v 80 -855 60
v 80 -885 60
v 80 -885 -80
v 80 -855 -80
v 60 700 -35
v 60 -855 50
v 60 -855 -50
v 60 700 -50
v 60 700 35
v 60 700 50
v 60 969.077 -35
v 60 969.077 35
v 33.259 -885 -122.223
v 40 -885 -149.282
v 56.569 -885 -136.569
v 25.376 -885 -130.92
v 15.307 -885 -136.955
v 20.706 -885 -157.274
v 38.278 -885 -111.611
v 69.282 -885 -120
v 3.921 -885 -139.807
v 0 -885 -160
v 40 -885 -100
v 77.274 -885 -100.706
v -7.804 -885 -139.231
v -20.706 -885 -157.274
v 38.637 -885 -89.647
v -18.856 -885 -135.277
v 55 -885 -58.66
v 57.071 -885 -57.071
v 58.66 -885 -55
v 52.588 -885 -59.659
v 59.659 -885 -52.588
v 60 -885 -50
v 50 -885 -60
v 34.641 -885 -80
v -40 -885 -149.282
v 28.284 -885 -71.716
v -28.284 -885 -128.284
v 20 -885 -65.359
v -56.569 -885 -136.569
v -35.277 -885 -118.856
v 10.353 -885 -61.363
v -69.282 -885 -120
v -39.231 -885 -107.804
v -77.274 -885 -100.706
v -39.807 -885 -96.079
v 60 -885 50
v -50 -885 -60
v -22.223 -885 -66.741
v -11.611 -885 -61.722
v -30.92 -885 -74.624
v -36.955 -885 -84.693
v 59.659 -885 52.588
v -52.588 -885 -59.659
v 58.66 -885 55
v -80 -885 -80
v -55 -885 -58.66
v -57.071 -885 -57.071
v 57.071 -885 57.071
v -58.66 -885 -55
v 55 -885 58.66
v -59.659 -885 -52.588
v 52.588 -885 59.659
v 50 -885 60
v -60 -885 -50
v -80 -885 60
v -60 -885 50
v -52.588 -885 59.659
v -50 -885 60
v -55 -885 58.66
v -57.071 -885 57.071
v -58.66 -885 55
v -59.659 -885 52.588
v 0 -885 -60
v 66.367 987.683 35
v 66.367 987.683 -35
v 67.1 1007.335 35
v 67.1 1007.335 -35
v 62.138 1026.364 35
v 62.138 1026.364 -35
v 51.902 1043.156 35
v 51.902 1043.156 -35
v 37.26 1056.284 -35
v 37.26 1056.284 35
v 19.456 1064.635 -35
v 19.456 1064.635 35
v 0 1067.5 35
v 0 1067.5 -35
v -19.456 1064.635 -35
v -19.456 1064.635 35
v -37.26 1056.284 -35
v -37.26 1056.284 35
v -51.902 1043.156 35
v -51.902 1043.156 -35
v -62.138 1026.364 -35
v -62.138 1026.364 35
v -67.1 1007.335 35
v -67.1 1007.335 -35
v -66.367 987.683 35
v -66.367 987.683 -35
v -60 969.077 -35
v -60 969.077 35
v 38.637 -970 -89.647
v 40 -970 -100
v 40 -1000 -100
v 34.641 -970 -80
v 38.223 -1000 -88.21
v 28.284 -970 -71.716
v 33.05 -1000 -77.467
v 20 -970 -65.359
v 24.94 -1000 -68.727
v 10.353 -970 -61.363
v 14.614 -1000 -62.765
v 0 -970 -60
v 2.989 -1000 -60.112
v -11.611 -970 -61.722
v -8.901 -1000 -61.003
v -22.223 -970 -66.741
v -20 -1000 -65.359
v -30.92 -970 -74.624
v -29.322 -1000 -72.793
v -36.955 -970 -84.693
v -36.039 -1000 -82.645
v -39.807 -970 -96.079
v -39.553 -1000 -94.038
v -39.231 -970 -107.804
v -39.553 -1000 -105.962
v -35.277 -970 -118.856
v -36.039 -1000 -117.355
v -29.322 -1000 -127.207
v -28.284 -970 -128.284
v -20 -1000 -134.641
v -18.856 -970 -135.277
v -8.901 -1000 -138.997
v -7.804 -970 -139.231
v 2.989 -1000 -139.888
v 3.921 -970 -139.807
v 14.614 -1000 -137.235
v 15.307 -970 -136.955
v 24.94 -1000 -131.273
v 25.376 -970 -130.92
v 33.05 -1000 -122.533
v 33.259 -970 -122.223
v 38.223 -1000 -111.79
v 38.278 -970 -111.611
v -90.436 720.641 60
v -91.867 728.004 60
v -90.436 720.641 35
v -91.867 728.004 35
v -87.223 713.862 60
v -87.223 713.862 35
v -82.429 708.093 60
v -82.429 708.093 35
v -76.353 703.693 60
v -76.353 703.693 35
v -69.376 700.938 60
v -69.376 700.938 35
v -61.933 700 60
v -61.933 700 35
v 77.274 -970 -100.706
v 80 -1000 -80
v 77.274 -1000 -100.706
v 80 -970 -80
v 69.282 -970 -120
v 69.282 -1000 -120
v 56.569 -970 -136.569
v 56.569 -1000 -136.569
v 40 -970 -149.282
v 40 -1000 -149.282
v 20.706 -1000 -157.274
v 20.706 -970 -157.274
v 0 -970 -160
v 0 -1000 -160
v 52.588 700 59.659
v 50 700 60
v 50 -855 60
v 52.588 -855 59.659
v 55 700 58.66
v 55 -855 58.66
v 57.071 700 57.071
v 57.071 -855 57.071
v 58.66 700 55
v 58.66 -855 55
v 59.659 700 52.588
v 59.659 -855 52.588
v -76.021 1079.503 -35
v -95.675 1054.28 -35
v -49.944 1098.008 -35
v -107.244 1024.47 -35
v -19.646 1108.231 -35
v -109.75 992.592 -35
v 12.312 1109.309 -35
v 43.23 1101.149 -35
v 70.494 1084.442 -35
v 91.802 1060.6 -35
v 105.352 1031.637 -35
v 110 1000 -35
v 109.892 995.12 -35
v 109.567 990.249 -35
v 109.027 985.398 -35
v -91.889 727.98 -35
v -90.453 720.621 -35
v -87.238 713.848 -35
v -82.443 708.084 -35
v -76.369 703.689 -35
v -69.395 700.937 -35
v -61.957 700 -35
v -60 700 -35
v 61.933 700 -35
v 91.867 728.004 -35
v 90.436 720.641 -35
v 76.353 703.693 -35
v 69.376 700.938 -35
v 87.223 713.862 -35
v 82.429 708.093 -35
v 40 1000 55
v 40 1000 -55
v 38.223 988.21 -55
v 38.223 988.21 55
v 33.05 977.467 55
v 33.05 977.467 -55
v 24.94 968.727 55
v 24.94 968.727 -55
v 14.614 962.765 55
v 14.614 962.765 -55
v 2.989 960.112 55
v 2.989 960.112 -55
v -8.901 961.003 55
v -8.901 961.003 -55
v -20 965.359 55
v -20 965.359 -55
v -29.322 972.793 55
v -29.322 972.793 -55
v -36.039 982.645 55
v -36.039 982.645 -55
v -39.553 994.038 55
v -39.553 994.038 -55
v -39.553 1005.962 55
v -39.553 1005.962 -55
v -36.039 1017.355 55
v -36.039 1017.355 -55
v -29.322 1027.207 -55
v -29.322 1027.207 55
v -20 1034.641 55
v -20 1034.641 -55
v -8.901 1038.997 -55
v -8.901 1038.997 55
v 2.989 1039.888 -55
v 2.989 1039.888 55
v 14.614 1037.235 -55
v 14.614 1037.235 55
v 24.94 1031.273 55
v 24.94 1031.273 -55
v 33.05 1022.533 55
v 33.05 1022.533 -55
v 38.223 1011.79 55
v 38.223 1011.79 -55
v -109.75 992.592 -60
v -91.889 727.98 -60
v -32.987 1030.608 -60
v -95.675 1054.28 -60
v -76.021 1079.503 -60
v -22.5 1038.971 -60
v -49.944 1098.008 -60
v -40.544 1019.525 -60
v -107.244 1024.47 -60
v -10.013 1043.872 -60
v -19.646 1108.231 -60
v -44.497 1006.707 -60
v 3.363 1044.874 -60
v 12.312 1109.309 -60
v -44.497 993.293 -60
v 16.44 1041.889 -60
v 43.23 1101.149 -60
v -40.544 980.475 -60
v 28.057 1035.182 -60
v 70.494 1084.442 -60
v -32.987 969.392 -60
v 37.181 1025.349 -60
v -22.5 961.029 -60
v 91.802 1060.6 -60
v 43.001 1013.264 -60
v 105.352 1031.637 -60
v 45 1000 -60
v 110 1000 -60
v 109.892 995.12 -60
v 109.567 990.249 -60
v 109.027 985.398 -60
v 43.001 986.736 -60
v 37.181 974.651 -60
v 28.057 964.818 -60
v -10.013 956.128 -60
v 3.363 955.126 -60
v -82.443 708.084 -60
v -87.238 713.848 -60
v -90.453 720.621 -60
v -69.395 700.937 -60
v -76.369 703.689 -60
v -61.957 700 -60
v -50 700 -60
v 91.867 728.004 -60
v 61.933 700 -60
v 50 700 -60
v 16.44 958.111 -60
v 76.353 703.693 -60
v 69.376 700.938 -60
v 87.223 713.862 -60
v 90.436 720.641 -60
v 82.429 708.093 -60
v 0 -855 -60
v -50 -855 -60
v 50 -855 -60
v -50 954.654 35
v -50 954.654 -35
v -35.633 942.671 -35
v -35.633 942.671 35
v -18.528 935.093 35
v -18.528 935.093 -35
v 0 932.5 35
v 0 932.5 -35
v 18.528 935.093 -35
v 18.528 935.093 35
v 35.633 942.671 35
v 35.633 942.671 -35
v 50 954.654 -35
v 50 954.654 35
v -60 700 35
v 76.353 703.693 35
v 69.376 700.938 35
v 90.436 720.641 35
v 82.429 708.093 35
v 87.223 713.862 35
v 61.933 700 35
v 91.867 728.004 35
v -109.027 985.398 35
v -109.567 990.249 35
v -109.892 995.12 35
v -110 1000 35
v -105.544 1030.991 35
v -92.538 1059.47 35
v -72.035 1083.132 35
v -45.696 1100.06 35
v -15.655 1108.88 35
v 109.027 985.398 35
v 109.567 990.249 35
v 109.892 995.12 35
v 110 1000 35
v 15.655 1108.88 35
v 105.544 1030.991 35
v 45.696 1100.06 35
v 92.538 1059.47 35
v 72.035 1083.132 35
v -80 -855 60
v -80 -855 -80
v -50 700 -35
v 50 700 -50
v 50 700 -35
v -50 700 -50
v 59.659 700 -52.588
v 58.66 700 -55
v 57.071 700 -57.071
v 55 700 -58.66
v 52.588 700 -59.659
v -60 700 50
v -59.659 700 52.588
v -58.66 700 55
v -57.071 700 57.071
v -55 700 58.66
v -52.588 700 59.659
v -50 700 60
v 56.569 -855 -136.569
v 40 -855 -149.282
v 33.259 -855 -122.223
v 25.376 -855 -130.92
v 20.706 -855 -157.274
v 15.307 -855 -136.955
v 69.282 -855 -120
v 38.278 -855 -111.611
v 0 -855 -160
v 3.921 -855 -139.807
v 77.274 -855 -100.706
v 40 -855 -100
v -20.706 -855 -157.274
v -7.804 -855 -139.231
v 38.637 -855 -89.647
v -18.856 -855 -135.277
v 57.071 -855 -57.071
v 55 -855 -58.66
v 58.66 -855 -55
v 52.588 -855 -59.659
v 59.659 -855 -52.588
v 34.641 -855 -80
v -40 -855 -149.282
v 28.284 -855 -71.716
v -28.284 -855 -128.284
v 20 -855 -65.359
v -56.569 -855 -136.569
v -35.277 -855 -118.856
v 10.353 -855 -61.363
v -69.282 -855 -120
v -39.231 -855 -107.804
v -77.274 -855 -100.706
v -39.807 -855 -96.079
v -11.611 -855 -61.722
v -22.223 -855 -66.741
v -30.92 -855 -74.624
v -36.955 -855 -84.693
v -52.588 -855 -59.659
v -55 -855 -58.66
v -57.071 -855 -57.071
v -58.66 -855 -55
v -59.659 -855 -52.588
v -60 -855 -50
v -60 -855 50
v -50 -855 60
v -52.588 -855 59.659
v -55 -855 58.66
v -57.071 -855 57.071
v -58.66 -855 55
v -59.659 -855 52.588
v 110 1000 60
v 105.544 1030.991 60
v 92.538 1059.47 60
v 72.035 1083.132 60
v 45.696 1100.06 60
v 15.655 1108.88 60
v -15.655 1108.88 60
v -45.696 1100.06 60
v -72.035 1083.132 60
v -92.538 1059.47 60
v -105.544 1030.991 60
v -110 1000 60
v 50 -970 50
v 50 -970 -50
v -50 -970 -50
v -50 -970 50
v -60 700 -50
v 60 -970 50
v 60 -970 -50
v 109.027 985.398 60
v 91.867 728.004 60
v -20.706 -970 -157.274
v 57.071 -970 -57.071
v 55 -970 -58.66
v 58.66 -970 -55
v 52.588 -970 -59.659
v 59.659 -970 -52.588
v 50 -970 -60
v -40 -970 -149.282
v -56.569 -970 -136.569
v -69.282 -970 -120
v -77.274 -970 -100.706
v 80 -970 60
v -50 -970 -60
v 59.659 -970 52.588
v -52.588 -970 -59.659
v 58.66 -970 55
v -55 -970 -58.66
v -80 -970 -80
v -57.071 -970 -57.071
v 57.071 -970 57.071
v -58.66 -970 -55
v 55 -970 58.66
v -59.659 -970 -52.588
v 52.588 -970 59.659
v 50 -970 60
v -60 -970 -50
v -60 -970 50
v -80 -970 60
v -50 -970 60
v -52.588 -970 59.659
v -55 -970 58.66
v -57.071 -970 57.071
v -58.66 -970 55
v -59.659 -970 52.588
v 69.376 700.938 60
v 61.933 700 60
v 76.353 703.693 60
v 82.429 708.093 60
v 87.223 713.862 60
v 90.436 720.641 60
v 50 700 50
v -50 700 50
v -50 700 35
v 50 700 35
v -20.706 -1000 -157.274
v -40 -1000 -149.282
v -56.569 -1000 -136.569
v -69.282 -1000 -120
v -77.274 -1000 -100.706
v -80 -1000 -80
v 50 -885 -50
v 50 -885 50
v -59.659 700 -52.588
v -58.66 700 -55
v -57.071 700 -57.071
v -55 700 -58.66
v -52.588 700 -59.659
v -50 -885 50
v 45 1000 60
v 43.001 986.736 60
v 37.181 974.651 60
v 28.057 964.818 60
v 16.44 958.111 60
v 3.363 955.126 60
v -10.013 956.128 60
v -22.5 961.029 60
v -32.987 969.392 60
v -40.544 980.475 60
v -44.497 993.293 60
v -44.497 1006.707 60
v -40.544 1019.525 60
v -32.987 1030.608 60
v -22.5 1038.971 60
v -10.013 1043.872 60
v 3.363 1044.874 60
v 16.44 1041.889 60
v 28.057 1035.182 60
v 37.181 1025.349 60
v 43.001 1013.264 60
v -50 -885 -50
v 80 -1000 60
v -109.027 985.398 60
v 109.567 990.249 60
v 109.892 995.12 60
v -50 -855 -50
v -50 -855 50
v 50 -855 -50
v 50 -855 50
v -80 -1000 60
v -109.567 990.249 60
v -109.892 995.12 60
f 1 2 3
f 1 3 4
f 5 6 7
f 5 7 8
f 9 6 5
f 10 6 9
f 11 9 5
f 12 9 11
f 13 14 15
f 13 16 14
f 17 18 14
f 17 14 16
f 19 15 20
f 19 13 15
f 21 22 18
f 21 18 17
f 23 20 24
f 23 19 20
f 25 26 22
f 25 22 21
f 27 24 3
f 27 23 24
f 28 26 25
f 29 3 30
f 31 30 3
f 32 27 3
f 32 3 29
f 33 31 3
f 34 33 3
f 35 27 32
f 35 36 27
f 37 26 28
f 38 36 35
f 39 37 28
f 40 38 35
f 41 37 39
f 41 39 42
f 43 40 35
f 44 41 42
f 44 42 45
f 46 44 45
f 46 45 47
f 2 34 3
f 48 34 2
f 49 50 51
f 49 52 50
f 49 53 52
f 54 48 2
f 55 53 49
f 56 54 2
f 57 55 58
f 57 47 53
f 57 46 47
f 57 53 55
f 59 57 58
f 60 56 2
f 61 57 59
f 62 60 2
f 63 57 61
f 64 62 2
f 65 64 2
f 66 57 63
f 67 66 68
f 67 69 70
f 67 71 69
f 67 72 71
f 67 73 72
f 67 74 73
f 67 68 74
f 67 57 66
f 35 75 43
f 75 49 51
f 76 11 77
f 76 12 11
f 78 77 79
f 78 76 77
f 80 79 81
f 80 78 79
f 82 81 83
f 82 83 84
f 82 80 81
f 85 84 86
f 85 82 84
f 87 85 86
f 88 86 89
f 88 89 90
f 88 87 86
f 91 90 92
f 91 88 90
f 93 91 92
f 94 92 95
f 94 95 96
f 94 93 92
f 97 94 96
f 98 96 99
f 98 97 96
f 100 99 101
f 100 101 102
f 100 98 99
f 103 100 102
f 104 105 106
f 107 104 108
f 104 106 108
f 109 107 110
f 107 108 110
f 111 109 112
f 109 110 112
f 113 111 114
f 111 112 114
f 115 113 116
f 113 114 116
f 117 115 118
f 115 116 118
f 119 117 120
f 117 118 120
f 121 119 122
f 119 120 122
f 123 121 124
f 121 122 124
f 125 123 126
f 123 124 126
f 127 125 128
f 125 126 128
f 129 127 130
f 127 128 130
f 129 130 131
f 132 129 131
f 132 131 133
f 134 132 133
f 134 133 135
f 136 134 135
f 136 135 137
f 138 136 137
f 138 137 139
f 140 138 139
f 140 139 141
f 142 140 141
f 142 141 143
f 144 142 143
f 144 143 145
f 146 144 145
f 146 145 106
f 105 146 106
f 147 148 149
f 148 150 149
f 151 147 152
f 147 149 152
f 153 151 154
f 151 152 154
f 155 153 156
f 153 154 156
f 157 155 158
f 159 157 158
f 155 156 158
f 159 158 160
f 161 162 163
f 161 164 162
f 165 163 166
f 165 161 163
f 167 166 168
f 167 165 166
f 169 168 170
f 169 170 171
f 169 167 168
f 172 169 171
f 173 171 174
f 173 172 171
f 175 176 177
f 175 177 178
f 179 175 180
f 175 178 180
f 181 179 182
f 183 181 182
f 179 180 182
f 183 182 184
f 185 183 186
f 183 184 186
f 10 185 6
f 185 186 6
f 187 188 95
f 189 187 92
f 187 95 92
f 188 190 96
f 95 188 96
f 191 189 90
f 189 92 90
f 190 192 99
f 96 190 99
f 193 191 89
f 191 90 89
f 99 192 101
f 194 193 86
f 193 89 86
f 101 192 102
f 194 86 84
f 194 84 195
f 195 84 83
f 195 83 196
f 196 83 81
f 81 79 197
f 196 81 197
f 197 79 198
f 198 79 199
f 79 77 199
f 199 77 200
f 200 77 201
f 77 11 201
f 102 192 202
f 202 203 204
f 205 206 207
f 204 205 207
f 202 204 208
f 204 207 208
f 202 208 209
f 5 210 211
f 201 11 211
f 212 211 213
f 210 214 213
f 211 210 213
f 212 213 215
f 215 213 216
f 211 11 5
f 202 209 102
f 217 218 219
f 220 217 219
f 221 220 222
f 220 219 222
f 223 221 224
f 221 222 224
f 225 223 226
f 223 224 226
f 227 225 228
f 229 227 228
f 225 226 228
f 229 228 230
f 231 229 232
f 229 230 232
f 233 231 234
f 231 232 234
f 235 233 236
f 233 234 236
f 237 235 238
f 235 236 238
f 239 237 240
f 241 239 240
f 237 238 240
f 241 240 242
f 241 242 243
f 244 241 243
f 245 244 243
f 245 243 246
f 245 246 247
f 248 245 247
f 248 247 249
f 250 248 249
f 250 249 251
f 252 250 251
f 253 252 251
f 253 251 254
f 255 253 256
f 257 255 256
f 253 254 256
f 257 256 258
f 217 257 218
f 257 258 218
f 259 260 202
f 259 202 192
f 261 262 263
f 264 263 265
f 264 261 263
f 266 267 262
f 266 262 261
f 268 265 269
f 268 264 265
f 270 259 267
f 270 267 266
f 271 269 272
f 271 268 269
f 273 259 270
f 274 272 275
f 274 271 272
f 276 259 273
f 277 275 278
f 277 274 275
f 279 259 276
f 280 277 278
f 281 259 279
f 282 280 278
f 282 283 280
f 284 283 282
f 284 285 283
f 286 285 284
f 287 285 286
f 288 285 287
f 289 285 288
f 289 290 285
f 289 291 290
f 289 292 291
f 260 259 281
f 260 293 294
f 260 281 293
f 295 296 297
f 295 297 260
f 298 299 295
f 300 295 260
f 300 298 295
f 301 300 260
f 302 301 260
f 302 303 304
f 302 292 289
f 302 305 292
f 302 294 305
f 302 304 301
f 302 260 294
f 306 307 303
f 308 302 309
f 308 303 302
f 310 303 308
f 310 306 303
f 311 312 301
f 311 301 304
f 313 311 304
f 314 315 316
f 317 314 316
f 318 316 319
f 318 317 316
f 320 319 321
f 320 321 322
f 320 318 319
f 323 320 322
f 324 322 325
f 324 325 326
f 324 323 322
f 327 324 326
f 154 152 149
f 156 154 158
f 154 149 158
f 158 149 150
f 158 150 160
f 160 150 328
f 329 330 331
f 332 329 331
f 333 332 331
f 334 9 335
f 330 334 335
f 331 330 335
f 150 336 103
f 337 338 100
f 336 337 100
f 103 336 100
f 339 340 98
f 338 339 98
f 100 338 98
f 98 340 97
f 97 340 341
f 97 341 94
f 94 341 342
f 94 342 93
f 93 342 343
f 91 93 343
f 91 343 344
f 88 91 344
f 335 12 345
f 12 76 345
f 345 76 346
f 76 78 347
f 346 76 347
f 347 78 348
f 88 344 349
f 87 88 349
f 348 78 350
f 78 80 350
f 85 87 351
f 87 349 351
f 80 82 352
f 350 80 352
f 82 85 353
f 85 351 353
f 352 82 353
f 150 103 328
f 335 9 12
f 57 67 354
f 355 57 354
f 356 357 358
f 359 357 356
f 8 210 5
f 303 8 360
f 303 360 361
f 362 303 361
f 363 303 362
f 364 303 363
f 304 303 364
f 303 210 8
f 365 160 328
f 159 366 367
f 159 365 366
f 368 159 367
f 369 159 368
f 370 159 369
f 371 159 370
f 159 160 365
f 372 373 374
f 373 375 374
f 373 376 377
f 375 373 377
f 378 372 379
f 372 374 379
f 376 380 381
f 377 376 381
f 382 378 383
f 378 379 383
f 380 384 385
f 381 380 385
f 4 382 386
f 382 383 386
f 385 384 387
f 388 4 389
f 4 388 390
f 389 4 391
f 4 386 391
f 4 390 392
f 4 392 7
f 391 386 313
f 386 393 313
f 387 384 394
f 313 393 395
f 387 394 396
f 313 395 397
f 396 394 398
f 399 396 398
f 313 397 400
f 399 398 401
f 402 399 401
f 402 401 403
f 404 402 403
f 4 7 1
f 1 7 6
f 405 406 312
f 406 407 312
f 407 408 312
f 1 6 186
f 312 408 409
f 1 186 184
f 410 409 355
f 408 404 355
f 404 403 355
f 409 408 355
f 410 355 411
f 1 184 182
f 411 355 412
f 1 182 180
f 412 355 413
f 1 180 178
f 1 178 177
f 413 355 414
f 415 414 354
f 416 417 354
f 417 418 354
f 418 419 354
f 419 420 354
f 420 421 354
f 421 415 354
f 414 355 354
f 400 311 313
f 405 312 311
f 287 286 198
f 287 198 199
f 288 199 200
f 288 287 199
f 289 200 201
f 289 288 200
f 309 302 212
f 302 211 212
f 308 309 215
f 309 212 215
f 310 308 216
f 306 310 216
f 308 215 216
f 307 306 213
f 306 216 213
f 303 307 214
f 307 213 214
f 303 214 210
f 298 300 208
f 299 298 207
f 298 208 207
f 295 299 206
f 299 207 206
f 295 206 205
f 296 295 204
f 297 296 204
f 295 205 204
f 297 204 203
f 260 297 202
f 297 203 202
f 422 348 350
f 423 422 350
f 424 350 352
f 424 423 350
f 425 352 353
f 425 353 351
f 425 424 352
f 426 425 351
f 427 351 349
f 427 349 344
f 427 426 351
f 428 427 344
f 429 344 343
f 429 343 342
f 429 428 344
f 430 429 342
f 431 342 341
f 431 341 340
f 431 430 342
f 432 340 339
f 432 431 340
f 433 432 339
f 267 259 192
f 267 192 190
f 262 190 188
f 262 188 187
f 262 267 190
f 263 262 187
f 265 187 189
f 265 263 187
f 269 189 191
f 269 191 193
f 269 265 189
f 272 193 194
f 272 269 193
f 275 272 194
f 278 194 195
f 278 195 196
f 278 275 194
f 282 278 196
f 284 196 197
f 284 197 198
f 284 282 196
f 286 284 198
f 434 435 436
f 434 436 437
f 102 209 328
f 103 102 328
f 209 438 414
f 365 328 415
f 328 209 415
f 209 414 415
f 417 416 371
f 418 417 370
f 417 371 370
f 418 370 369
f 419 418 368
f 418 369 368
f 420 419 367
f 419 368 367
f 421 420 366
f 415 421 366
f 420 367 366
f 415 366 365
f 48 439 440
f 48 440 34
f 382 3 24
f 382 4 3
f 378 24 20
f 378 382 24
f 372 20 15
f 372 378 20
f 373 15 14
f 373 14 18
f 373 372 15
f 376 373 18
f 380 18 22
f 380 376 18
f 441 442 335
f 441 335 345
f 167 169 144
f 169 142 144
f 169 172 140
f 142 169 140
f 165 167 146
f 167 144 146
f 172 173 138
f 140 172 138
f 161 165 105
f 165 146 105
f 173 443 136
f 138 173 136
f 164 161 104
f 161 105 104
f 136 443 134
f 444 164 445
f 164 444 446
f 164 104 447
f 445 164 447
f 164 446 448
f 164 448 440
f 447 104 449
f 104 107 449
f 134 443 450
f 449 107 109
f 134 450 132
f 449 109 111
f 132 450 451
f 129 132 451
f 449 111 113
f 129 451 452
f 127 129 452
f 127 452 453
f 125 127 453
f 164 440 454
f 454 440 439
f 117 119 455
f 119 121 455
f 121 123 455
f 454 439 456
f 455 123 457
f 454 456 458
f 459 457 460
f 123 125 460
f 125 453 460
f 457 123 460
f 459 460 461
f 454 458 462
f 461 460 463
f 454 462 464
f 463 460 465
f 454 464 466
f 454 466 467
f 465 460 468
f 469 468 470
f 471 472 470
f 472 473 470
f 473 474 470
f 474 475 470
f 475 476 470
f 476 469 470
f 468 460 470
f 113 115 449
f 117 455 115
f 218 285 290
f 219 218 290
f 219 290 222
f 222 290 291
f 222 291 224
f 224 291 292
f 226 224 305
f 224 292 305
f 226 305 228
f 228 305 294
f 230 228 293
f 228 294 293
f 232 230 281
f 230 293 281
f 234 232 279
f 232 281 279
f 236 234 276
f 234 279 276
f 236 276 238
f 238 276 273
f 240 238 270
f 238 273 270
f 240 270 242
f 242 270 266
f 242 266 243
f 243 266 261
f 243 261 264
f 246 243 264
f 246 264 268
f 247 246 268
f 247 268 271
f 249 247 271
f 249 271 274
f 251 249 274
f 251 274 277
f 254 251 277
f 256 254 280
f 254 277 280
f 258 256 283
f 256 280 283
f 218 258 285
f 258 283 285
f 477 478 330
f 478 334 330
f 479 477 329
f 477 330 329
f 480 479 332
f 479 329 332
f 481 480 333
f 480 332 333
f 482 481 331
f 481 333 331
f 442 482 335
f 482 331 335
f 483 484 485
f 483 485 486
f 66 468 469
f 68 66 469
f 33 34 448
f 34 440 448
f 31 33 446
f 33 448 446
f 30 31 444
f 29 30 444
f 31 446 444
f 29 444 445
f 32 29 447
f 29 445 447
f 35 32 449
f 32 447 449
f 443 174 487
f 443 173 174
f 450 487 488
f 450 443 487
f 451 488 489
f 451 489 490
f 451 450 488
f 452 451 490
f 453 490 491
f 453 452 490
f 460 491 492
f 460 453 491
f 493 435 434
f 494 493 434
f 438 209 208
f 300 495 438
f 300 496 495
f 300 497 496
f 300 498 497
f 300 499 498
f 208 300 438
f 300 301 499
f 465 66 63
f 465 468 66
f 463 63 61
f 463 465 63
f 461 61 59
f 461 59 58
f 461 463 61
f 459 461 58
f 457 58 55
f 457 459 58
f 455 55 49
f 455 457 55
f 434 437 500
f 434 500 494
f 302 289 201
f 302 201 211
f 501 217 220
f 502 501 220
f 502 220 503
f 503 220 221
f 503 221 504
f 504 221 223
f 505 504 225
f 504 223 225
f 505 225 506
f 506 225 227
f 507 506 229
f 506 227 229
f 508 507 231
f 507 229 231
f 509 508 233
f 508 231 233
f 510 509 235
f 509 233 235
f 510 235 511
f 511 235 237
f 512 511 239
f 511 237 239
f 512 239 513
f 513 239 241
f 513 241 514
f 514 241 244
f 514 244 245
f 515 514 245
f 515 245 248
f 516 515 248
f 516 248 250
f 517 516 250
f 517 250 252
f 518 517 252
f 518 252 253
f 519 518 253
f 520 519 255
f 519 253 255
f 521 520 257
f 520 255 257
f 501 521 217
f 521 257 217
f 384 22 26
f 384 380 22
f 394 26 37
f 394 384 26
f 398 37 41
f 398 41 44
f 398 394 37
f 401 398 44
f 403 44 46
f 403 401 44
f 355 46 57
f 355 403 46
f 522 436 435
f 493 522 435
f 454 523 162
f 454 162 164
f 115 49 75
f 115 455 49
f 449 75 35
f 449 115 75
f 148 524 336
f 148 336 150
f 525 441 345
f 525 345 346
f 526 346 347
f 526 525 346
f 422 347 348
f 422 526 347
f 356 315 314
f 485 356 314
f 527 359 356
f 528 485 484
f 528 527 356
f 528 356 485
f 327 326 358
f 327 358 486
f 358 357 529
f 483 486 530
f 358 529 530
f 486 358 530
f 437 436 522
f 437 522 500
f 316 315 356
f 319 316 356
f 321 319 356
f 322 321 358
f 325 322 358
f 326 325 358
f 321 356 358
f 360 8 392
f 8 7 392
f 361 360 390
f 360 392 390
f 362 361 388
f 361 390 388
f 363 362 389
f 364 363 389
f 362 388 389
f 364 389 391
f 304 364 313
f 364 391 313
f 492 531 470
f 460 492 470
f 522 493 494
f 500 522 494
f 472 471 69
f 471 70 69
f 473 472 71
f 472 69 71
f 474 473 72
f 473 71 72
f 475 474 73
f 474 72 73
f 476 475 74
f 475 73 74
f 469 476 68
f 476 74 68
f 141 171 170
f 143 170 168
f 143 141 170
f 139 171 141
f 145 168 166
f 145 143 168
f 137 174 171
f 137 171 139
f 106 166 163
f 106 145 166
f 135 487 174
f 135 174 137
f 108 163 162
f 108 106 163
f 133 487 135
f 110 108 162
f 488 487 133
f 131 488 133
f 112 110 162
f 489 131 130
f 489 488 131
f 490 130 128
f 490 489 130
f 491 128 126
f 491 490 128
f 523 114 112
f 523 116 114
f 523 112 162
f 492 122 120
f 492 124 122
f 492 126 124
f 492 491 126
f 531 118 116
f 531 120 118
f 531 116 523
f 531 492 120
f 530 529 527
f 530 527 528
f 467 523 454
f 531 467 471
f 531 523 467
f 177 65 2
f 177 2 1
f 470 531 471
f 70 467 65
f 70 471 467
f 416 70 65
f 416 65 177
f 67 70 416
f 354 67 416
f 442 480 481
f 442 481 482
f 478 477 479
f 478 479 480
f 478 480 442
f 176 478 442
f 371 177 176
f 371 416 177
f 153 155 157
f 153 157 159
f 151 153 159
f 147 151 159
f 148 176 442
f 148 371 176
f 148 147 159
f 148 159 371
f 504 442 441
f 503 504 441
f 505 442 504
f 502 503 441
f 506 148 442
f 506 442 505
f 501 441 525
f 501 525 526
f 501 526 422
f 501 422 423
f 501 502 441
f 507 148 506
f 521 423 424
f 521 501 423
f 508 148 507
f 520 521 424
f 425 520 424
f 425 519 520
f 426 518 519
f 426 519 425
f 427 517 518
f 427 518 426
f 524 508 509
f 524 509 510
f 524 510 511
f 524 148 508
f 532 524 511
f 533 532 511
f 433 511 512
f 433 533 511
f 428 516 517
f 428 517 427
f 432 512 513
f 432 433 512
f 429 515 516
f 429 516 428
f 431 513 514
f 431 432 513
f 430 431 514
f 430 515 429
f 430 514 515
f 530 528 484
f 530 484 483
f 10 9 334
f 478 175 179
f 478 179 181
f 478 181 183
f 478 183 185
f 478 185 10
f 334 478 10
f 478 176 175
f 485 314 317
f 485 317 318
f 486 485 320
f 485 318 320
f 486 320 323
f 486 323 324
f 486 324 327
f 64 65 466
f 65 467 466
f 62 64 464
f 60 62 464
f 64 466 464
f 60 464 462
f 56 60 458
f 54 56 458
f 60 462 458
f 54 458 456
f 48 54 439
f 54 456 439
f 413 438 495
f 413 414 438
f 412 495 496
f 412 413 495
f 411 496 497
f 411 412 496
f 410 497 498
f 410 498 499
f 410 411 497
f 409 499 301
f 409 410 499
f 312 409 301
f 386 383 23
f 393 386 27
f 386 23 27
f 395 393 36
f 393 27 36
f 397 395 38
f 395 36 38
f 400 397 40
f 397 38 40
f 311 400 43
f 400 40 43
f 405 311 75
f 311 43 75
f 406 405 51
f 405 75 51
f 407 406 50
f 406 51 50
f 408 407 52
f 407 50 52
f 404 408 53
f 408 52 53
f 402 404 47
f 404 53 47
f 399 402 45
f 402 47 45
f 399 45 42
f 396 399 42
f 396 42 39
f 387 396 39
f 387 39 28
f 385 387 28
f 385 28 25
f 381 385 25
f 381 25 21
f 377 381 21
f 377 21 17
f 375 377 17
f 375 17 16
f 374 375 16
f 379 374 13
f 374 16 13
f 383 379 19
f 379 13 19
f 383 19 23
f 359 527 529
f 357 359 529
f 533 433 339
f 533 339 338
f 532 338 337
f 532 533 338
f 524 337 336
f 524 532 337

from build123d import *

# Parameters (mm, degrees)
F0_W      = 120
F0_H      = 120
F0_W_2    = 100
F0_H_2    = 100
F1_DEPTH  = 1000
F2_R      = 67.5
F3_DEPTH  = 120
F4_R      = 40
F5_DEPTH  = 120
F7_DEPTH  = 25
F9_DEPTH  = 25
F10_R     = 40
F11_DEPTH = 160
F12_W     = 30
F12_H     = 220
F13_DEPTH = 140
F14_W     = 30
F14_H     = 220
F15_DEPTH = 20
F16_W     = 30
F16_H     = 220
F17_DEPTH = 140
F18_W     = 30
F18_H     = 220
F19_DEPTH = 20
F20_R     = 40
F21_DEPTH = 145
F22_R     = 10
F23_R     = 79.99999
F24_R     = 30
F25_SIZE  = 5


# Not quite as in the source:
# - a fillet or chamfer is up to 0.001 mm smaller than in the source, because OpenCascade refuses the exact size


with BuildPart() as f1:
    # F0 (on Front) → F1 (new body, symmetric)
    with BuildSketch(Plane.XZ):
        Rectangle(F0_W, F0_H)
        Rectangle(F0_W_2, F0_H_2, mode=Mode.SUBTRACT)
    extrude(amount=F1_DEPTH, both=True)

    # F2 (on face) → F3 (join)
    with BuildSketch(Plane.XY.offset(60)):
        with Locations((0, 1000)):
            Circle(F2_R)
    extrude(amount=-F3_DEPTH)

    # F4 (on face) → F5 (cut)
    with BuildSketch(Plane.XY.offset(60)):
        with Locations((0, 1000)):
            Circle(F4_R)
    extrude(amount=-F5_DEPTH, mode=Mode.SUBTRACT)

    # F6 (on face) → F7 (join)
    with BuildSketch(Plane.XY.offset(60)):
        with BuildLine():
            Line((109.0265486726, 985.3982300885), (110, 1000))
            ThreePointArc((110, 1000), (0, 1110), (-110, 1000))
            Line((-110, 1000), (-109.0265486726, 985.3982300885))
            ThreePointArc((-109.0265486726, 985.3982300885), (0, 890), (109.0265486726, 985.3982300885))
        make_face()
        with BuildLine():
            ThreePointArc((109.0265486726, 985.3982300885), (109.7563673642, 992.6829088424), (110, 1000))
            Line((110, 1000), (109.0265486726, 985.3982300885))
        make_face()
        with BuildLine():
            Line((-109.0265486726, 985.3982300885), (-110, 1000))
            ThreePointArc((-110, 1000), (-109.7563673642, 992.6829088424), (-109.0265486726, 985.3982300885))
        make_face()
        with BuildLine():
            Line((90, 700), (109.0265486726, 985.3982300885))
            ThreePointArc((109.0265486726, 985.3982300885), (0, 890), (-109.0265486726, 985.3982300885))
            Line((-109.0265486726, 985.3982300885), (-90, 700))
            Line((-90, 700), (90, 700))
        make_face()
    extrude(amount=-F7_DEPTH)

    # F8 (on face) → F9 (join)
    with BuildSketch(Plane(origin=(0, 0, -60), x_dir=(1, 0, 0), z_dir=(0, 0, -1))):
        with BuildLine():
            Line((109.0265486726, -985.3982300885), (110, -1000))
            ThreePointArc((110, -1000), (109.7563673642, -992.6829088424), (109.0265486726, -985.3982300885))
        make_face()
        with BuildLine():
            ThreePointArc((-109.7502513746, -992.5917395282), (-3.706234531, -1109.9375451136), (110, -1000))
            Line((110, -1000), (109.0265486726, -985.3982300885))
            ThreePointArc((109.0265486726, -985.3982300885), (-3.6149109138, -890.0594141407), (-109.7502513746, -992.5917395282))
        make_face()
        with BuildLine():
            ThreePointArc((-109.7502513746, -992.5917395282), (-3.6149109138, -890.0594141407), (109.0265486726, -985.3982300885))
            Line((109.0265486726, -985.3982300885), (90, -700))
            Line((90, -700), (-90, -700))
            Line((-90, -700), (-109.7502513746, -992.5917395282))
        make_face()
    extrude(amount=-F9_DEPTH)

    # F10 (on face) → F11 (cut)
    with BuildSketch(Plane(origin=(0, 0, -60), x_dir=(1, 0, 0), z_dir=(0, 0, -1))):
        with Locations((0, -1000)):
            Circle(F10_R)
    extrude(amount=-F11_DEPTH, mode=Mode.SUBTRACT)

    # F12 (on face) → F13 (join)
    with BuildSketch(Plane.YZ.offset(60)):
        with Locations((-870, -50)):
            Rectangle(F12_W, F12_H)
    extrude(amount=-F13_DEPTH)

    # F14 (on face) → F15 (join)
    with BuildSketch(Plane.YZ.offset(60)):
        with Locations((-870, -50)):
            Rectangle(F14_W, F14_H)
    extrude(amount=F15_DEPTH)

    # F16 (on face) → F17 (join)
    with BuildSketch(Plane.YZ.offset(60)):
        with Locations((-985, -50)):
            Rectangle(F16_W, F16_H)
    extrude(amount=-F17_DEPTH)

    # F18 (on face) → F19 (join)
    with BuildSketch(Plane.YZ.offset(60)):
        with Locations((-985, -50)):
            Rectangle(F18_W, F18_H)
    extrude(amount=F19_DEPTH)

    # F20 (on face) → F21 (cut)
    with BuildSketch(Plane.XZ.offset(1000)):
        with Locations((0, -100)):
            Circle(F20_R)
    extrude(amount=-F21_DEPTH, mode=Mode.SUBTRACT)

    # F22
    f22_edges = [f1.edges().sort_by_distance(p)[0] for p in [
        (60, -77.5, 60),
        (60, -77.5, -60),
        (60, -927.5, -60),
        (60, -927.5, 60),
        (-60, -77.5, 60),
        (-60, -927.5, 60),
        (-60, -927.5, -60),
        (-60, -77.5, -60),
    ]]
    fillet(f22_edges, radius=F22_R)

    # F23 (radius 80 in the source; OpenCascade refuses exactly that, so slightly less here)
    f23_edges = [f1.edges().sort_by_distance(p)[0] for p in [
        (-80, -985, -160),
        (80, -985, -160),
        (80, -870, -160),
        (-80, -870, -160),
    ]]
    fillet(f23_edges, radius=F23_R)

    # F24
    f24_edges = [f1.edges().sort_by_distance(p)[0] for p in [
        (-90, 700, -47.5),
        (-90, 700, 47.5),
        (90, 700, -47.5),
        (90, 700, 47.5),
    ]]
    fillet(f24_edges, radius=F24_R)

    # F25
    f25_edges = [f1.edges().sort_by_distance(p)[0] for p in [
        (-40, 1000, 60),
        (-40, 1000, -60),
    ]]
    chamfer(f25_edges, length=F25_SIZE)


solid = f1.part
